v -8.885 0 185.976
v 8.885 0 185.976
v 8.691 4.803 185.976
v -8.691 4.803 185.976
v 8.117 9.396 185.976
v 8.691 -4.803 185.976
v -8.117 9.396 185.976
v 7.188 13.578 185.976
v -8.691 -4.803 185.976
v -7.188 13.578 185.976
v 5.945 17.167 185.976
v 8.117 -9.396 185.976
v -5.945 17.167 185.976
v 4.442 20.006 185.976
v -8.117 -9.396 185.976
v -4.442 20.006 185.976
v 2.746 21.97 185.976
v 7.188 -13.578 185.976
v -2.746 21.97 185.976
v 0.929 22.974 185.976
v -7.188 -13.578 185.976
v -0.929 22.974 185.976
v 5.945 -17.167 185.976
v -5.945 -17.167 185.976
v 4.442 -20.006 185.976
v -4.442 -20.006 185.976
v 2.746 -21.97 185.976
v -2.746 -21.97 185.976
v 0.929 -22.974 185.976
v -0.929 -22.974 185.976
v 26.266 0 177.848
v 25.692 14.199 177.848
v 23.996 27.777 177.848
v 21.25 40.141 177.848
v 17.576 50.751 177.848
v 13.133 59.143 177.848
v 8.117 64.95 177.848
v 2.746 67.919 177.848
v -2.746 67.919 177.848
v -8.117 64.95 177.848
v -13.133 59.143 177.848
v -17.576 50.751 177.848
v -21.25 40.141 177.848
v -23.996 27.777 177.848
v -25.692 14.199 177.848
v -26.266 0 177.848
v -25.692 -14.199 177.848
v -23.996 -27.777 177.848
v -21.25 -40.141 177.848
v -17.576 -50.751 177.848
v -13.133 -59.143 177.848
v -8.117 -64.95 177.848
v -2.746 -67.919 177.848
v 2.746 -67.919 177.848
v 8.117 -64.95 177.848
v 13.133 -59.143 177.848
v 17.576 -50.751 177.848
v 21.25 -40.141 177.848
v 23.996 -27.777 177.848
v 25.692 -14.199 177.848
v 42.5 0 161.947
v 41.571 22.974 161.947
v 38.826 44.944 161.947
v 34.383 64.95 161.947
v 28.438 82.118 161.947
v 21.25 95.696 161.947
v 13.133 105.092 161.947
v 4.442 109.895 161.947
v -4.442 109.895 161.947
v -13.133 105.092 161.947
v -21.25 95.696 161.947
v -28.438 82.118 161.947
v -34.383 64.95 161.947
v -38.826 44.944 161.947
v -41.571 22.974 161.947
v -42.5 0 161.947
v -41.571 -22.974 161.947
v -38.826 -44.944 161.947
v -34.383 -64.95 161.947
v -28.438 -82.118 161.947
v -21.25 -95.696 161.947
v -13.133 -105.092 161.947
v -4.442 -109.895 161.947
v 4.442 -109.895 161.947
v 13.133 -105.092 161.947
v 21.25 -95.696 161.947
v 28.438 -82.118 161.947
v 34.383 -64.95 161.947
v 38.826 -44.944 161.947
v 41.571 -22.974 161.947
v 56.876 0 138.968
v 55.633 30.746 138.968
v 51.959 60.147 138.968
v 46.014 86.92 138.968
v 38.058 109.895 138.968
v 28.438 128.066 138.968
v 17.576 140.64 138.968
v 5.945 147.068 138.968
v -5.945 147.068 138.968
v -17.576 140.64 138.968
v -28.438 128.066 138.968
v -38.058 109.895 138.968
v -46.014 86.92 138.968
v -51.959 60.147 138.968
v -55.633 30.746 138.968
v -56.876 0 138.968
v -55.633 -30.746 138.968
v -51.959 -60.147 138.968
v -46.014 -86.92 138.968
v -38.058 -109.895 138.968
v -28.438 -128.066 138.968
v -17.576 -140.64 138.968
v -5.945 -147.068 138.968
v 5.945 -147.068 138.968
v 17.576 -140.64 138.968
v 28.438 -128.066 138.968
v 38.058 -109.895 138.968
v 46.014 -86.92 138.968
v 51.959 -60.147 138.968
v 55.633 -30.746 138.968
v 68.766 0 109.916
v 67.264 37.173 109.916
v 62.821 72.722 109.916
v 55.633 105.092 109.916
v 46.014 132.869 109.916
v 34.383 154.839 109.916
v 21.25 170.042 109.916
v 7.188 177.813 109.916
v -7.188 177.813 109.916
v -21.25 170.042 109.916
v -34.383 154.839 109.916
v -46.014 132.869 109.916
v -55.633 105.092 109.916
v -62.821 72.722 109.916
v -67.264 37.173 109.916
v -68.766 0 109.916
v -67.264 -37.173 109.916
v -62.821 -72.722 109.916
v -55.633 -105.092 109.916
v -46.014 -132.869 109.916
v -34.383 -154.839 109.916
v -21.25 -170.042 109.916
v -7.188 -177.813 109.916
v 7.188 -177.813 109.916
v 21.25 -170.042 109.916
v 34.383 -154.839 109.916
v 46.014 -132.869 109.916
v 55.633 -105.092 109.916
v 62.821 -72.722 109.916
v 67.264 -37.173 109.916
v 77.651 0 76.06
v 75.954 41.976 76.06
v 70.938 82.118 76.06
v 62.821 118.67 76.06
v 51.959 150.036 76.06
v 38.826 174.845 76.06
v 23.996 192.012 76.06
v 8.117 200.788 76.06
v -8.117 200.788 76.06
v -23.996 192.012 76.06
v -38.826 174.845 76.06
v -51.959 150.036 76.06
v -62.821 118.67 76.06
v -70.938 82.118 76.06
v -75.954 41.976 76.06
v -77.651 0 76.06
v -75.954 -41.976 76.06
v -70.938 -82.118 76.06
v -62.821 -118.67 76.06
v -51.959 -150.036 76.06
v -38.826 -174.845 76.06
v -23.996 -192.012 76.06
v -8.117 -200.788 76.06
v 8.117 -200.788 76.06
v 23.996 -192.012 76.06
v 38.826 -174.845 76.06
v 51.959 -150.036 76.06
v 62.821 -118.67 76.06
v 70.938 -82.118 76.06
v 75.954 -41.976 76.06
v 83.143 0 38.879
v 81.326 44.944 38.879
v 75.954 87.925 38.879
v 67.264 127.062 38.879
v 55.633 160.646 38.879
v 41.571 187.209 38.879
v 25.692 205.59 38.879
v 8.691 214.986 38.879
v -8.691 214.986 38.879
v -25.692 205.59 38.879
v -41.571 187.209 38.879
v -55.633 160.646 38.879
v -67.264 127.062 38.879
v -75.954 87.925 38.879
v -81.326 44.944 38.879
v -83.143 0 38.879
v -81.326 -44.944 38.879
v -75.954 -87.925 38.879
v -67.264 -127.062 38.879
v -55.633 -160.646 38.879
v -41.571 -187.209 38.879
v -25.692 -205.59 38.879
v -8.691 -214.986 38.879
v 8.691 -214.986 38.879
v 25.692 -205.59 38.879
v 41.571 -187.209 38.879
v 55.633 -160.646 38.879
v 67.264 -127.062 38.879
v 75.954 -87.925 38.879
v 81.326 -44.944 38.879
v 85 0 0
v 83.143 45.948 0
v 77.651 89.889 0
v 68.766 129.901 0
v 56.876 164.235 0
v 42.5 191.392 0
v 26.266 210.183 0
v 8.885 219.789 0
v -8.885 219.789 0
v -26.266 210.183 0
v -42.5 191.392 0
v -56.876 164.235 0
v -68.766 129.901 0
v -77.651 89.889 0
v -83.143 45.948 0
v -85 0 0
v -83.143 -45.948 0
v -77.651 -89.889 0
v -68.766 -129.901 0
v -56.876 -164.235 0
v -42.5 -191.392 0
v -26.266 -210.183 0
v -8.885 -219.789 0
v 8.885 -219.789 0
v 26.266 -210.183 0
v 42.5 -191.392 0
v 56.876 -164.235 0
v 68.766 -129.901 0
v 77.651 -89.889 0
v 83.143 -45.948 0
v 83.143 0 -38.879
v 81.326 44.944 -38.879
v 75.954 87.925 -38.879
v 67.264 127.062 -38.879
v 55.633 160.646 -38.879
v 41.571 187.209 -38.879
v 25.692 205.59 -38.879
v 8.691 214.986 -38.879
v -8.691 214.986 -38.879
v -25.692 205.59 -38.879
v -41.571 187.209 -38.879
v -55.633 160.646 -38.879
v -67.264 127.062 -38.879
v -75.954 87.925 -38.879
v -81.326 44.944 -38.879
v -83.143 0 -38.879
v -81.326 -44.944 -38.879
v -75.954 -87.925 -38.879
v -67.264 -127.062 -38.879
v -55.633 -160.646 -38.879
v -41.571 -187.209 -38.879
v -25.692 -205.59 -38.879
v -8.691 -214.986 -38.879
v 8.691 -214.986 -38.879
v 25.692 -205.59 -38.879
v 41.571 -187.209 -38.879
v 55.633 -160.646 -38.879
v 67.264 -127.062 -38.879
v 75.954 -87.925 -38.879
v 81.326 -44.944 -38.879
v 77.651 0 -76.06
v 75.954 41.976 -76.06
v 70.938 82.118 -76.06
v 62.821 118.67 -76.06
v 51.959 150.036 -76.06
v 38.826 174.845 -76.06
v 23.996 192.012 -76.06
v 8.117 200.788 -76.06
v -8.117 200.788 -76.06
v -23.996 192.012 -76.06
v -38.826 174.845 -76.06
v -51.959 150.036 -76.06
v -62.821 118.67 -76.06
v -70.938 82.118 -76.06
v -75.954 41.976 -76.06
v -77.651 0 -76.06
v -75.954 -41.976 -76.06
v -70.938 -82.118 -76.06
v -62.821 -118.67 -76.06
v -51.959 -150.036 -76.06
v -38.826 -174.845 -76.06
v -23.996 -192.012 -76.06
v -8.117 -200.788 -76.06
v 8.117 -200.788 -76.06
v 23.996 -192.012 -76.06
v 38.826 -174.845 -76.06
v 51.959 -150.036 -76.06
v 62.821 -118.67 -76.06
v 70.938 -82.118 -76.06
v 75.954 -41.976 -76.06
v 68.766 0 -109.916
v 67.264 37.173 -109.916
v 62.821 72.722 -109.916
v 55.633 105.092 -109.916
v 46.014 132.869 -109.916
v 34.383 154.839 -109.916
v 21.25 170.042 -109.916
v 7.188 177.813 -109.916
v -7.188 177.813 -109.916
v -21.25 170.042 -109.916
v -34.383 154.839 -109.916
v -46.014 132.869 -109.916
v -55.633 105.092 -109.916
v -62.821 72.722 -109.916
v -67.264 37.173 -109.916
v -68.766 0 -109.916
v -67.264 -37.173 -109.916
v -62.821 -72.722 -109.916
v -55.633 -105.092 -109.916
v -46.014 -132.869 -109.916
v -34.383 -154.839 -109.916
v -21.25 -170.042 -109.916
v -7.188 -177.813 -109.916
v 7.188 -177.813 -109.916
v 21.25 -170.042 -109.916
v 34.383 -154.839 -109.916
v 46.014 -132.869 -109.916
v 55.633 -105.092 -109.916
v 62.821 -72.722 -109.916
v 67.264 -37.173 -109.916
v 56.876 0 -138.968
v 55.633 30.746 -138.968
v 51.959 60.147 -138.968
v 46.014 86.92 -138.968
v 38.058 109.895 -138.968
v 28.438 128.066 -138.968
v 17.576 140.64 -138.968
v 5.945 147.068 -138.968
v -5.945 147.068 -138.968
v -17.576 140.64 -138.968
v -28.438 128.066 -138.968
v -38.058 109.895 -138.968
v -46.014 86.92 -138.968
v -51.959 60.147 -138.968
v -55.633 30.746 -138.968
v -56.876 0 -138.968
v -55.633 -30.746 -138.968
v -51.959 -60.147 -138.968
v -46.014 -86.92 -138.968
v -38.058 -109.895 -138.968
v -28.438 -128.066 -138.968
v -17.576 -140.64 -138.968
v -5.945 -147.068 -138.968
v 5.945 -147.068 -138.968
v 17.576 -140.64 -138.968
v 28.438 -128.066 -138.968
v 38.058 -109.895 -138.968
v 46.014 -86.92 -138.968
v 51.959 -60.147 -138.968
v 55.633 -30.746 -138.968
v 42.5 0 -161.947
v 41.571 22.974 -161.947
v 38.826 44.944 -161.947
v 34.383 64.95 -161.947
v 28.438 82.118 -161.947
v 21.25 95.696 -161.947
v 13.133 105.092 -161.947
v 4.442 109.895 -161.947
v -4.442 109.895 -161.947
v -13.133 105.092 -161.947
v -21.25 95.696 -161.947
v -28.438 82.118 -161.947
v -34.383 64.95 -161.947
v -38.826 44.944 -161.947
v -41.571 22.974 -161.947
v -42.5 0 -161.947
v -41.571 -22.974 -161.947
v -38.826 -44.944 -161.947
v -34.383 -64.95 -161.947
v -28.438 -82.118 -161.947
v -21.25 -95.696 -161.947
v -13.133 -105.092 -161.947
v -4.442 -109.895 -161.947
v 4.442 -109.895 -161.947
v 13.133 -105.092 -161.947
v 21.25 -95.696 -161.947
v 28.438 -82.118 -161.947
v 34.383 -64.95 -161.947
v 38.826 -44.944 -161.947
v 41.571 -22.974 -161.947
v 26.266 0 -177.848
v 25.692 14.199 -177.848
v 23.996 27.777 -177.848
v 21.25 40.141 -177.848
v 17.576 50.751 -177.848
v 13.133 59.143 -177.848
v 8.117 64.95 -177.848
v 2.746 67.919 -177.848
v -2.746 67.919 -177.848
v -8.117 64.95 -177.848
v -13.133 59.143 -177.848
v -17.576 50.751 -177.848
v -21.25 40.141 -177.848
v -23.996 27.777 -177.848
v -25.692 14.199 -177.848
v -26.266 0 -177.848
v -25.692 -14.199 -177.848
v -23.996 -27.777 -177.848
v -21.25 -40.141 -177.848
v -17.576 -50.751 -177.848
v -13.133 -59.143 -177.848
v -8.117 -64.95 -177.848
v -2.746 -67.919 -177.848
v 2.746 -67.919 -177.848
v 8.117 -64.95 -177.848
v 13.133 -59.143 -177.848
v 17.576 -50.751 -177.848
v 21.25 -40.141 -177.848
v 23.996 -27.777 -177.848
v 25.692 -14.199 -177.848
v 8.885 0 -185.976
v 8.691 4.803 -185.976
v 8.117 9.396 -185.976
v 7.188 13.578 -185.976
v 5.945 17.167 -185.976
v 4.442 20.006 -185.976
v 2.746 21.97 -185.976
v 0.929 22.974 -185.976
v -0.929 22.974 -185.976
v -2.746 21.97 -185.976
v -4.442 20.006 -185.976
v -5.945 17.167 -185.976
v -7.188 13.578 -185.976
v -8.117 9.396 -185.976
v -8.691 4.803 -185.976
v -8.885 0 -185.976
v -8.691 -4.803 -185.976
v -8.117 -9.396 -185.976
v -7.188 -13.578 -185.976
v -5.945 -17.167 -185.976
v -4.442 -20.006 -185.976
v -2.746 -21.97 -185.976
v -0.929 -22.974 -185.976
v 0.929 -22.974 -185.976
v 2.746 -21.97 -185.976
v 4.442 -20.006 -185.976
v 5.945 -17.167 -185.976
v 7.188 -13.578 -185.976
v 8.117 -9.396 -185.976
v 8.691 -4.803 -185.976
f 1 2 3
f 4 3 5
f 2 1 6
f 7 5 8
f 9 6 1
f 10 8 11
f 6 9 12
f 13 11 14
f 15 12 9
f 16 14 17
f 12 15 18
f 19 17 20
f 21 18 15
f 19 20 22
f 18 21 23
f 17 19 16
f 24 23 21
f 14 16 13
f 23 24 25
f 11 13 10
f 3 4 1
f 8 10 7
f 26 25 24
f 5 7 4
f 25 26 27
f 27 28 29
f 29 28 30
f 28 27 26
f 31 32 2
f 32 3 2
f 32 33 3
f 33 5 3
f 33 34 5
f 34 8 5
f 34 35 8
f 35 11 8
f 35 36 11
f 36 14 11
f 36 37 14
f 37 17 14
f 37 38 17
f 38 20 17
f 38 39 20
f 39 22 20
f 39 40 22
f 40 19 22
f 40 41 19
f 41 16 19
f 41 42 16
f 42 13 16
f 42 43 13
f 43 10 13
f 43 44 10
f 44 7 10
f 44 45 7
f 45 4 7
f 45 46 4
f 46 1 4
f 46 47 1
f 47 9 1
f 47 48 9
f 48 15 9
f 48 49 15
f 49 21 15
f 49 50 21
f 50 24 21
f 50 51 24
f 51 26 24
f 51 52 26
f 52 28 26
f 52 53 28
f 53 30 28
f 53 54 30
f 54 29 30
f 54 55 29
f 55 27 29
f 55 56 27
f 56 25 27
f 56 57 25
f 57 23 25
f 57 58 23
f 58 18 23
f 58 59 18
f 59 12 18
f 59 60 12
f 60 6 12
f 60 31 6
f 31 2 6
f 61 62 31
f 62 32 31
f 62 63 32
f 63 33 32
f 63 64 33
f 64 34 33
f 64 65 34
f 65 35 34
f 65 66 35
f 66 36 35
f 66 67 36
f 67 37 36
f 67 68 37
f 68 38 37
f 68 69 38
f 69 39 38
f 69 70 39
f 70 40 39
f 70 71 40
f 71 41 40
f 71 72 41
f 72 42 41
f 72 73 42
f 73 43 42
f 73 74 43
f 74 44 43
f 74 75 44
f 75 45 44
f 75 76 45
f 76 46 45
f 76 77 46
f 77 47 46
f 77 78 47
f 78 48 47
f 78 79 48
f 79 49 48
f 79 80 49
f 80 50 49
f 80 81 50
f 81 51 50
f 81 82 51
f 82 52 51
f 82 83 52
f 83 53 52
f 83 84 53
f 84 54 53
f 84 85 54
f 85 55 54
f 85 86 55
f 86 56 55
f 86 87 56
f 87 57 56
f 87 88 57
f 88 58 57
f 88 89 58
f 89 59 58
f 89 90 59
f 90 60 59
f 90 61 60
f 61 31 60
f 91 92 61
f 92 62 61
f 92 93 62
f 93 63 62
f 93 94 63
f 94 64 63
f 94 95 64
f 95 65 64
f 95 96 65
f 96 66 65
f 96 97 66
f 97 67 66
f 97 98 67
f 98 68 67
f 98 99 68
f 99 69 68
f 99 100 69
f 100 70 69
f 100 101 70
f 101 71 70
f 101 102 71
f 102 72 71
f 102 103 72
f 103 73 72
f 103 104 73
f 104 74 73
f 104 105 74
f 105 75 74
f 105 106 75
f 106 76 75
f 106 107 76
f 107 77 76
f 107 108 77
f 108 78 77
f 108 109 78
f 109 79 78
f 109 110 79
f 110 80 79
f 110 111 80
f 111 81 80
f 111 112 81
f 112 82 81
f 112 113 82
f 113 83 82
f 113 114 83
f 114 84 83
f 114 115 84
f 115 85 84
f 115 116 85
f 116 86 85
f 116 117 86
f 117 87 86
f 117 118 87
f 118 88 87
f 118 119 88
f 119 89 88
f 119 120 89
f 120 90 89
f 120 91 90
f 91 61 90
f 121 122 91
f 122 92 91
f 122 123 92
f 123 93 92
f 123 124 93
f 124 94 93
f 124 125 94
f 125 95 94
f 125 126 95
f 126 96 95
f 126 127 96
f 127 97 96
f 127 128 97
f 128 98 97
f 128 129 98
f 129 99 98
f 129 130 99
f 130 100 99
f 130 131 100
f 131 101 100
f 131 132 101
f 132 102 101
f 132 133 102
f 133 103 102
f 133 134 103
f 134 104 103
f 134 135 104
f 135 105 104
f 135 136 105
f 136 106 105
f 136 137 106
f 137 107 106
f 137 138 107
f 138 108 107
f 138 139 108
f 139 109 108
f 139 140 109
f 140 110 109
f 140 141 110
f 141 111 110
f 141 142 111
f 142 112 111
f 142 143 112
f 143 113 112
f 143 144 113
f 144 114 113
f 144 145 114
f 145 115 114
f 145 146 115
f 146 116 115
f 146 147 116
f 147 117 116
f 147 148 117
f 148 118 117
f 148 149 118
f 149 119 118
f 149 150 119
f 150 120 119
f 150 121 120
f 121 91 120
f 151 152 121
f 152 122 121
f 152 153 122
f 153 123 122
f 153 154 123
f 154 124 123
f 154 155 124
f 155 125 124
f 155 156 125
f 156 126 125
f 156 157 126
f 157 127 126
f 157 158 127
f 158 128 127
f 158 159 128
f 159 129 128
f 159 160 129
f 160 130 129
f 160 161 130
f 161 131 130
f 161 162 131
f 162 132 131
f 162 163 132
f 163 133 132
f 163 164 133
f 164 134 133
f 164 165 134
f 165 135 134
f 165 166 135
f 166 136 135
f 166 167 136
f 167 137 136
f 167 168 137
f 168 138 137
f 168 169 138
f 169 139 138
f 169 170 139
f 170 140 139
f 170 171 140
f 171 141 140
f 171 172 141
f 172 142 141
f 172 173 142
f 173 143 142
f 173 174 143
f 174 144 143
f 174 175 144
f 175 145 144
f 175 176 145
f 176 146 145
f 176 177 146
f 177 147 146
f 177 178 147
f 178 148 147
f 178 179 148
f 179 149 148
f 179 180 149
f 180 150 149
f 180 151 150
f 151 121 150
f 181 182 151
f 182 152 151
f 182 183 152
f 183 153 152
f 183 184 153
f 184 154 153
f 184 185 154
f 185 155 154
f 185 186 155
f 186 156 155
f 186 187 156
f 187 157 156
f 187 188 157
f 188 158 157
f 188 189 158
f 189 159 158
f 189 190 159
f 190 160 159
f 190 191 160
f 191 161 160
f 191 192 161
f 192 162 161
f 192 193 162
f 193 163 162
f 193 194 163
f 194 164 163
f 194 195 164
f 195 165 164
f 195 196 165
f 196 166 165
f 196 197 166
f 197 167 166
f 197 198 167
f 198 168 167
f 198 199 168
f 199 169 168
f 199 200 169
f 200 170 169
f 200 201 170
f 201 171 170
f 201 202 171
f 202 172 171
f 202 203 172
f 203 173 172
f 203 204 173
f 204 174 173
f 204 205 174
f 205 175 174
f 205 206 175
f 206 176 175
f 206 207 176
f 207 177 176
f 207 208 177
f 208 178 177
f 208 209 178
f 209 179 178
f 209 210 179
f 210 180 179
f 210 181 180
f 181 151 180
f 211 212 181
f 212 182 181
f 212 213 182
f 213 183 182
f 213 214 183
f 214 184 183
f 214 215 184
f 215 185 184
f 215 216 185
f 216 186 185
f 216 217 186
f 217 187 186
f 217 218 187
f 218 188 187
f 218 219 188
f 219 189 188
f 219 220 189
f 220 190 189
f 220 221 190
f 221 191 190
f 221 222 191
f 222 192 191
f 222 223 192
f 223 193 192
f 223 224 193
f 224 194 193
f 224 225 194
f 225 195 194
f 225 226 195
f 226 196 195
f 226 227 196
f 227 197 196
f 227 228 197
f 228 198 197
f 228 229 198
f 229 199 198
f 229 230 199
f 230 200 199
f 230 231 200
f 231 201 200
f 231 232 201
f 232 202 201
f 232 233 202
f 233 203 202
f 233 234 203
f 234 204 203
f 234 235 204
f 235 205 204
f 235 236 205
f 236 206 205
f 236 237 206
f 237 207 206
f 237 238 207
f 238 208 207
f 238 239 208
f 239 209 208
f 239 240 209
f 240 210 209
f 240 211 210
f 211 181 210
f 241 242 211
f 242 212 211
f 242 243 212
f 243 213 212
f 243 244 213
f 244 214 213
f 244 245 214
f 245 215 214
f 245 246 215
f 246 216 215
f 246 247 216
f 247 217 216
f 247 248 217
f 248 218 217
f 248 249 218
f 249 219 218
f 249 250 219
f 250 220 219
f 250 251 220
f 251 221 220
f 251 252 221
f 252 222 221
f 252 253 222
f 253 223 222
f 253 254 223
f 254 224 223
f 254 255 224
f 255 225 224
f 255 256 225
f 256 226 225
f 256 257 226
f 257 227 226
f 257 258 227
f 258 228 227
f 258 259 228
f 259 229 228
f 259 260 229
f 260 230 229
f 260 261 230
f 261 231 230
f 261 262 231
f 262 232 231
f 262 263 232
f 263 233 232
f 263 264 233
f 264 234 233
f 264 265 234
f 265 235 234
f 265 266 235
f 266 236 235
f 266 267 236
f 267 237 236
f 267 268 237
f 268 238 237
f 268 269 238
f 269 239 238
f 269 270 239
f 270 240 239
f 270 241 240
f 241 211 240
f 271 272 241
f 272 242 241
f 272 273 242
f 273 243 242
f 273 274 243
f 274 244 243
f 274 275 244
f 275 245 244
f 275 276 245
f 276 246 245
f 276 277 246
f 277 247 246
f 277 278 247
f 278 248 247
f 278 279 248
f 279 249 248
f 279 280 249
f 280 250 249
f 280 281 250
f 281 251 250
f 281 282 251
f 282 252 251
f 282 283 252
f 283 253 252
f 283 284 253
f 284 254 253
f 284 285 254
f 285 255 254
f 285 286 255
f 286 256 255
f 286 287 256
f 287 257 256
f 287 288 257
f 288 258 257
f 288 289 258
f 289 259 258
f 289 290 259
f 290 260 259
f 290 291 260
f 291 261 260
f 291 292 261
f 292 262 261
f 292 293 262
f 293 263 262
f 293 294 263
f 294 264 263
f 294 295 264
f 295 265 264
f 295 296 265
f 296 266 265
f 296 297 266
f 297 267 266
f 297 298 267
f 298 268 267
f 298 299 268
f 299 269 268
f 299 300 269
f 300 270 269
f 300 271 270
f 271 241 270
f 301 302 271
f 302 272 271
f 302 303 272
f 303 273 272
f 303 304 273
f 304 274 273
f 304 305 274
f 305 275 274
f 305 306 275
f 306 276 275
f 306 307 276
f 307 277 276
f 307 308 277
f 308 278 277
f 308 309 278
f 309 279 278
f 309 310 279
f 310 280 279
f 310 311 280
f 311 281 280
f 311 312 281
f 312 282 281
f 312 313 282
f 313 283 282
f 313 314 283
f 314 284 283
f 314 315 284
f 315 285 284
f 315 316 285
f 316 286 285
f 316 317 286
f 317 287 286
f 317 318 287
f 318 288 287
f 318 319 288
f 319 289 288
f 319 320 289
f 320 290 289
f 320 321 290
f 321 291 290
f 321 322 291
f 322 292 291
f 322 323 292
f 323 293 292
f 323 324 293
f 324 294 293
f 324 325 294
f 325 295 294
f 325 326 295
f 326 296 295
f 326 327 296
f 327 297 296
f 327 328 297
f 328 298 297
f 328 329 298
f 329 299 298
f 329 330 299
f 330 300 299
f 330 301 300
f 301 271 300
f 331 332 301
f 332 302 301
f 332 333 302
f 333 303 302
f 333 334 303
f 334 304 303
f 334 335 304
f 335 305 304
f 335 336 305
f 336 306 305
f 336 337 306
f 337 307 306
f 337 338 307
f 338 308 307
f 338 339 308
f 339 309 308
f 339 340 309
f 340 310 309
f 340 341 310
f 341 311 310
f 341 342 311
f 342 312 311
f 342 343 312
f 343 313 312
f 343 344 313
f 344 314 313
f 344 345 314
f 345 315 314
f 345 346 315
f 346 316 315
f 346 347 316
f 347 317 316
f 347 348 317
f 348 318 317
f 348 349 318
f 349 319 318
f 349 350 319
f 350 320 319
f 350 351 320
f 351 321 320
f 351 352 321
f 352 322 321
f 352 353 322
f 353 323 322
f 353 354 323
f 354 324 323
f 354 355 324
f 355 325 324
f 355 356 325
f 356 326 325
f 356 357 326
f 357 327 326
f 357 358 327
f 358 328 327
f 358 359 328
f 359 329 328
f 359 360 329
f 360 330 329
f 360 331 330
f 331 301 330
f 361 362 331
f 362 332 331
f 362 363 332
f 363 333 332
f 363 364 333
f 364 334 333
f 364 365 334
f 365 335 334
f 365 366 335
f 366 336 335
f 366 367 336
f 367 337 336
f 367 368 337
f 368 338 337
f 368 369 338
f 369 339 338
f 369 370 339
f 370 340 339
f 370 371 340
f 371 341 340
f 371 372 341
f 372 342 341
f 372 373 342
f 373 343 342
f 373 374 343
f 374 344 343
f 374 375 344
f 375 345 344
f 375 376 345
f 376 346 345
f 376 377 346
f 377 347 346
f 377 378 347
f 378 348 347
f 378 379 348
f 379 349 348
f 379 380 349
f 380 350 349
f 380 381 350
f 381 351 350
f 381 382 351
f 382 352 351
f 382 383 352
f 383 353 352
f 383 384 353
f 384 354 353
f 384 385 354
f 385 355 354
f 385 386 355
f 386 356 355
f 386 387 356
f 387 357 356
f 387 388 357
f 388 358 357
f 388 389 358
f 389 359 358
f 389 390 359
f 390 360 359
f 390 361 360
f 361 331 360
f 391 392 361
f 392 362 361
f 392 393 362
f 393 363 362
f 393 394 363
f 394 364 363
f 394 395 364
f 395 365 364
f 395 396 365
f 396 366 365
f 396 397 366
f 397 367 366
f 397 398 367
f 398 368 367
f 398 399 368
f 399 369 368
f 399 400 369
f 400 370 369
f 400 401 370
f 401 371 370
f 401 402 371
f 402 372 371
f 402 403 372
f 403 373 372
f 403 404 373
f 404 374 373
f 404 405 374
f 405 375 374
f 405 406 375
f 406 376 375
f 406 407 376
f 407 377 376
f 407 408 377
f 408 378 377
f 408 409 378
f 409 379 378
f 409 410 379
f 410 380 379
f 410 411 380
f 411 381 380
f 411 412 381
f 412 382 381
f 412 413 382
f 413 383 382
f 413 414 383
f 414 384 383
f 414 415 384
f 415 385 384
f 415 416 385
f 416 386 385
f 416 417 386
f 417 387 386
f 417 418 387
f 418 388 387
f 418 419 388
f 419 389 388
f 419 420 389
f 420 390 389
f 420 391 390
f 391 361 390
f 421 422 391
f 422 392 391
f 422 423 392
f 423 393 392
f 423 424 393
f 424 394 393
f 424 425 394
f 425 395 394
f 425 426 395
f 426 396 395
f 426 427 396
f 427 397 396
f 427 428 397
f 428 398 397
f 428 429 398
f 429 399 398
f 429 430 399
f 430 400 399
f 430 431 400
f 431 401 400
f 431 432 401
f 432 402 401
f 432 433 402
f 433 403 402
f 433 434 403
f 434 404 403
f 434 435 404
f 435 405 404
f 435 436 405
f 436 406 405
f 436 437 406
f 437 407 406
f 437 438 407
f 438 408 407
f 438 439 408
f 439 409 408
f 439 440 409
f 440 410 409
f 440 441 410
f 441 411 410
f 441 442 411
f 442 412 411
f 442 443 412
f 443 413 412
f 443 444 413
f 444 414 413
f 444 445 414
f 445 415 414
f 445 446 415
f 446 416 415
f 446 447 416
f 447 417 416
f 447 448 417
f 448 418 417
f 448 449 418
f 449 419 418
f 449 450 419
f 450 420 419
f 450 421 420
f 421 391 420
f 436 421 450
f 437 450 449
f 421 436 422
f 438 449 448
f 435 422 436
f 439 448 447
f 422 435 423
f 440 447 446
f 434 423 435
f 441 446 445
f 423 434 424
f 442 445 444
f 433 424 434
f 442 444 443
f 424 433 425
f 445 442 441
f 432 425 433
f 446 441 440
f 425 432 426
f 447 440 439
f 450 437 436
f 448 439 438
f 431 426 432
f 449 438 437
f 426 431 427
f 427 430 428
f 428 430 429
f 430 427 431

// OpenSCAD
// Generated by SolidPython 1.0.1 on 2020-07-29 00:46:46


scale(v = [5, 13, 11]) {
	sphere(r = 17);
}
/***********************************************
*********      SolidPython code:      **********
************************************************
 
# import packages: SolidPython
from solid import *
from solid.utils import *
from itertools import chain, combinations, permutations


class Resize:

    def __init__(self, scad_file):
        self.scad_file = scad_file
        #self.scad_file = import_scad(scad_file)
        # cone/cylinder param:
        self.r1 = 0
        self.r2 = 0
        self.h = 0
        # rectangular prism param:
        self.w = 0
        self.l = 0
        # ellipse param:
        self.r = 0

    # import OpenScad code (file name corresponds to shape)


    # classify shape + parameters
    def assign(self, param1, param2, param3):
        if self.scad_file == 'cone.scad':
            self.r1 = param1
            self.r2 = param2
            self.h = param3
        elif self.scad_file == 'cylinder.scad':
            self.r1 = param1
            self.r2 = param2
            self.h = param3
        elif self.scad_file == 'rectangularPrism.scad':
            self.h = param1
            self.l = param2
            self.w = param3
        else:
            self.r = param1
            self.h = param2

    # resize parameters
    def iterate(self):
        x = range(3, 20, 2)
        i = 1
        if self.scad_file == 'cone.scad':
            tempList = list(permutations(x, 2))
            for temp in tempList:
                param1 = temp[0]
                param2 = temp[1]
                filepath = 'produced_scad_files/' + 'cone' + str(param1) + '_' + str(param2) + '_' + '.scad'
                scad_render_to_file(cylinder(h=param1, r1=param2, r2=0), filepath)

        elif self.scad_file == 'cylinder.scad':
            tempList = list(permutations(x, 3))
            for temp in tempList:
                param1 = temp[0]
                param2 = temp[1]
                filepath = 'produced_scad_files/' + 'cylinder' + str(param1) + '_' + str(param2) + '_' + '.scad'
                scad_render_to_file(cylinder(h=param1, r1=param2, r2=param2), filepath)

        elif self.scad_file == 'rectangularPrism.scad':
            tempList = list(permutations(x, 3))
            for temp in tempList:
                param1 = temp[0]
                param2 = temp[1]
                param3 = temp[2]
                filepath = 'produced_scad_files/' + 'rectangularPrism' + str(param1) + '_' + str(param2) + '_' + str(
                    param3) + '.scad'
                scad_render_to_file(cube(size=(param1, param2, param3)), filepath)

        elif self.scad_file == 'ellipse.scad':
            tempList = list(permutations(x, 4))
            for temp in tempList:
                param1 = temp[0]
                param2 = temp[1]
                param3 = temp[2]
                param4 = temp[3]
                filepath = 'produced_scad_files/' + 'ellipse' + str(param1) + '_' + str(param2) + '_' + str(param3) + '_' + str(param4) + '.scad'
                scad_render_to_file(scale([param1, param2, param3])(sphere(r=param4)), filepath)

    def render_to_scadfile(self):
        scad_render_to_file(scad, 'example.scad') 
 
************************************************/
